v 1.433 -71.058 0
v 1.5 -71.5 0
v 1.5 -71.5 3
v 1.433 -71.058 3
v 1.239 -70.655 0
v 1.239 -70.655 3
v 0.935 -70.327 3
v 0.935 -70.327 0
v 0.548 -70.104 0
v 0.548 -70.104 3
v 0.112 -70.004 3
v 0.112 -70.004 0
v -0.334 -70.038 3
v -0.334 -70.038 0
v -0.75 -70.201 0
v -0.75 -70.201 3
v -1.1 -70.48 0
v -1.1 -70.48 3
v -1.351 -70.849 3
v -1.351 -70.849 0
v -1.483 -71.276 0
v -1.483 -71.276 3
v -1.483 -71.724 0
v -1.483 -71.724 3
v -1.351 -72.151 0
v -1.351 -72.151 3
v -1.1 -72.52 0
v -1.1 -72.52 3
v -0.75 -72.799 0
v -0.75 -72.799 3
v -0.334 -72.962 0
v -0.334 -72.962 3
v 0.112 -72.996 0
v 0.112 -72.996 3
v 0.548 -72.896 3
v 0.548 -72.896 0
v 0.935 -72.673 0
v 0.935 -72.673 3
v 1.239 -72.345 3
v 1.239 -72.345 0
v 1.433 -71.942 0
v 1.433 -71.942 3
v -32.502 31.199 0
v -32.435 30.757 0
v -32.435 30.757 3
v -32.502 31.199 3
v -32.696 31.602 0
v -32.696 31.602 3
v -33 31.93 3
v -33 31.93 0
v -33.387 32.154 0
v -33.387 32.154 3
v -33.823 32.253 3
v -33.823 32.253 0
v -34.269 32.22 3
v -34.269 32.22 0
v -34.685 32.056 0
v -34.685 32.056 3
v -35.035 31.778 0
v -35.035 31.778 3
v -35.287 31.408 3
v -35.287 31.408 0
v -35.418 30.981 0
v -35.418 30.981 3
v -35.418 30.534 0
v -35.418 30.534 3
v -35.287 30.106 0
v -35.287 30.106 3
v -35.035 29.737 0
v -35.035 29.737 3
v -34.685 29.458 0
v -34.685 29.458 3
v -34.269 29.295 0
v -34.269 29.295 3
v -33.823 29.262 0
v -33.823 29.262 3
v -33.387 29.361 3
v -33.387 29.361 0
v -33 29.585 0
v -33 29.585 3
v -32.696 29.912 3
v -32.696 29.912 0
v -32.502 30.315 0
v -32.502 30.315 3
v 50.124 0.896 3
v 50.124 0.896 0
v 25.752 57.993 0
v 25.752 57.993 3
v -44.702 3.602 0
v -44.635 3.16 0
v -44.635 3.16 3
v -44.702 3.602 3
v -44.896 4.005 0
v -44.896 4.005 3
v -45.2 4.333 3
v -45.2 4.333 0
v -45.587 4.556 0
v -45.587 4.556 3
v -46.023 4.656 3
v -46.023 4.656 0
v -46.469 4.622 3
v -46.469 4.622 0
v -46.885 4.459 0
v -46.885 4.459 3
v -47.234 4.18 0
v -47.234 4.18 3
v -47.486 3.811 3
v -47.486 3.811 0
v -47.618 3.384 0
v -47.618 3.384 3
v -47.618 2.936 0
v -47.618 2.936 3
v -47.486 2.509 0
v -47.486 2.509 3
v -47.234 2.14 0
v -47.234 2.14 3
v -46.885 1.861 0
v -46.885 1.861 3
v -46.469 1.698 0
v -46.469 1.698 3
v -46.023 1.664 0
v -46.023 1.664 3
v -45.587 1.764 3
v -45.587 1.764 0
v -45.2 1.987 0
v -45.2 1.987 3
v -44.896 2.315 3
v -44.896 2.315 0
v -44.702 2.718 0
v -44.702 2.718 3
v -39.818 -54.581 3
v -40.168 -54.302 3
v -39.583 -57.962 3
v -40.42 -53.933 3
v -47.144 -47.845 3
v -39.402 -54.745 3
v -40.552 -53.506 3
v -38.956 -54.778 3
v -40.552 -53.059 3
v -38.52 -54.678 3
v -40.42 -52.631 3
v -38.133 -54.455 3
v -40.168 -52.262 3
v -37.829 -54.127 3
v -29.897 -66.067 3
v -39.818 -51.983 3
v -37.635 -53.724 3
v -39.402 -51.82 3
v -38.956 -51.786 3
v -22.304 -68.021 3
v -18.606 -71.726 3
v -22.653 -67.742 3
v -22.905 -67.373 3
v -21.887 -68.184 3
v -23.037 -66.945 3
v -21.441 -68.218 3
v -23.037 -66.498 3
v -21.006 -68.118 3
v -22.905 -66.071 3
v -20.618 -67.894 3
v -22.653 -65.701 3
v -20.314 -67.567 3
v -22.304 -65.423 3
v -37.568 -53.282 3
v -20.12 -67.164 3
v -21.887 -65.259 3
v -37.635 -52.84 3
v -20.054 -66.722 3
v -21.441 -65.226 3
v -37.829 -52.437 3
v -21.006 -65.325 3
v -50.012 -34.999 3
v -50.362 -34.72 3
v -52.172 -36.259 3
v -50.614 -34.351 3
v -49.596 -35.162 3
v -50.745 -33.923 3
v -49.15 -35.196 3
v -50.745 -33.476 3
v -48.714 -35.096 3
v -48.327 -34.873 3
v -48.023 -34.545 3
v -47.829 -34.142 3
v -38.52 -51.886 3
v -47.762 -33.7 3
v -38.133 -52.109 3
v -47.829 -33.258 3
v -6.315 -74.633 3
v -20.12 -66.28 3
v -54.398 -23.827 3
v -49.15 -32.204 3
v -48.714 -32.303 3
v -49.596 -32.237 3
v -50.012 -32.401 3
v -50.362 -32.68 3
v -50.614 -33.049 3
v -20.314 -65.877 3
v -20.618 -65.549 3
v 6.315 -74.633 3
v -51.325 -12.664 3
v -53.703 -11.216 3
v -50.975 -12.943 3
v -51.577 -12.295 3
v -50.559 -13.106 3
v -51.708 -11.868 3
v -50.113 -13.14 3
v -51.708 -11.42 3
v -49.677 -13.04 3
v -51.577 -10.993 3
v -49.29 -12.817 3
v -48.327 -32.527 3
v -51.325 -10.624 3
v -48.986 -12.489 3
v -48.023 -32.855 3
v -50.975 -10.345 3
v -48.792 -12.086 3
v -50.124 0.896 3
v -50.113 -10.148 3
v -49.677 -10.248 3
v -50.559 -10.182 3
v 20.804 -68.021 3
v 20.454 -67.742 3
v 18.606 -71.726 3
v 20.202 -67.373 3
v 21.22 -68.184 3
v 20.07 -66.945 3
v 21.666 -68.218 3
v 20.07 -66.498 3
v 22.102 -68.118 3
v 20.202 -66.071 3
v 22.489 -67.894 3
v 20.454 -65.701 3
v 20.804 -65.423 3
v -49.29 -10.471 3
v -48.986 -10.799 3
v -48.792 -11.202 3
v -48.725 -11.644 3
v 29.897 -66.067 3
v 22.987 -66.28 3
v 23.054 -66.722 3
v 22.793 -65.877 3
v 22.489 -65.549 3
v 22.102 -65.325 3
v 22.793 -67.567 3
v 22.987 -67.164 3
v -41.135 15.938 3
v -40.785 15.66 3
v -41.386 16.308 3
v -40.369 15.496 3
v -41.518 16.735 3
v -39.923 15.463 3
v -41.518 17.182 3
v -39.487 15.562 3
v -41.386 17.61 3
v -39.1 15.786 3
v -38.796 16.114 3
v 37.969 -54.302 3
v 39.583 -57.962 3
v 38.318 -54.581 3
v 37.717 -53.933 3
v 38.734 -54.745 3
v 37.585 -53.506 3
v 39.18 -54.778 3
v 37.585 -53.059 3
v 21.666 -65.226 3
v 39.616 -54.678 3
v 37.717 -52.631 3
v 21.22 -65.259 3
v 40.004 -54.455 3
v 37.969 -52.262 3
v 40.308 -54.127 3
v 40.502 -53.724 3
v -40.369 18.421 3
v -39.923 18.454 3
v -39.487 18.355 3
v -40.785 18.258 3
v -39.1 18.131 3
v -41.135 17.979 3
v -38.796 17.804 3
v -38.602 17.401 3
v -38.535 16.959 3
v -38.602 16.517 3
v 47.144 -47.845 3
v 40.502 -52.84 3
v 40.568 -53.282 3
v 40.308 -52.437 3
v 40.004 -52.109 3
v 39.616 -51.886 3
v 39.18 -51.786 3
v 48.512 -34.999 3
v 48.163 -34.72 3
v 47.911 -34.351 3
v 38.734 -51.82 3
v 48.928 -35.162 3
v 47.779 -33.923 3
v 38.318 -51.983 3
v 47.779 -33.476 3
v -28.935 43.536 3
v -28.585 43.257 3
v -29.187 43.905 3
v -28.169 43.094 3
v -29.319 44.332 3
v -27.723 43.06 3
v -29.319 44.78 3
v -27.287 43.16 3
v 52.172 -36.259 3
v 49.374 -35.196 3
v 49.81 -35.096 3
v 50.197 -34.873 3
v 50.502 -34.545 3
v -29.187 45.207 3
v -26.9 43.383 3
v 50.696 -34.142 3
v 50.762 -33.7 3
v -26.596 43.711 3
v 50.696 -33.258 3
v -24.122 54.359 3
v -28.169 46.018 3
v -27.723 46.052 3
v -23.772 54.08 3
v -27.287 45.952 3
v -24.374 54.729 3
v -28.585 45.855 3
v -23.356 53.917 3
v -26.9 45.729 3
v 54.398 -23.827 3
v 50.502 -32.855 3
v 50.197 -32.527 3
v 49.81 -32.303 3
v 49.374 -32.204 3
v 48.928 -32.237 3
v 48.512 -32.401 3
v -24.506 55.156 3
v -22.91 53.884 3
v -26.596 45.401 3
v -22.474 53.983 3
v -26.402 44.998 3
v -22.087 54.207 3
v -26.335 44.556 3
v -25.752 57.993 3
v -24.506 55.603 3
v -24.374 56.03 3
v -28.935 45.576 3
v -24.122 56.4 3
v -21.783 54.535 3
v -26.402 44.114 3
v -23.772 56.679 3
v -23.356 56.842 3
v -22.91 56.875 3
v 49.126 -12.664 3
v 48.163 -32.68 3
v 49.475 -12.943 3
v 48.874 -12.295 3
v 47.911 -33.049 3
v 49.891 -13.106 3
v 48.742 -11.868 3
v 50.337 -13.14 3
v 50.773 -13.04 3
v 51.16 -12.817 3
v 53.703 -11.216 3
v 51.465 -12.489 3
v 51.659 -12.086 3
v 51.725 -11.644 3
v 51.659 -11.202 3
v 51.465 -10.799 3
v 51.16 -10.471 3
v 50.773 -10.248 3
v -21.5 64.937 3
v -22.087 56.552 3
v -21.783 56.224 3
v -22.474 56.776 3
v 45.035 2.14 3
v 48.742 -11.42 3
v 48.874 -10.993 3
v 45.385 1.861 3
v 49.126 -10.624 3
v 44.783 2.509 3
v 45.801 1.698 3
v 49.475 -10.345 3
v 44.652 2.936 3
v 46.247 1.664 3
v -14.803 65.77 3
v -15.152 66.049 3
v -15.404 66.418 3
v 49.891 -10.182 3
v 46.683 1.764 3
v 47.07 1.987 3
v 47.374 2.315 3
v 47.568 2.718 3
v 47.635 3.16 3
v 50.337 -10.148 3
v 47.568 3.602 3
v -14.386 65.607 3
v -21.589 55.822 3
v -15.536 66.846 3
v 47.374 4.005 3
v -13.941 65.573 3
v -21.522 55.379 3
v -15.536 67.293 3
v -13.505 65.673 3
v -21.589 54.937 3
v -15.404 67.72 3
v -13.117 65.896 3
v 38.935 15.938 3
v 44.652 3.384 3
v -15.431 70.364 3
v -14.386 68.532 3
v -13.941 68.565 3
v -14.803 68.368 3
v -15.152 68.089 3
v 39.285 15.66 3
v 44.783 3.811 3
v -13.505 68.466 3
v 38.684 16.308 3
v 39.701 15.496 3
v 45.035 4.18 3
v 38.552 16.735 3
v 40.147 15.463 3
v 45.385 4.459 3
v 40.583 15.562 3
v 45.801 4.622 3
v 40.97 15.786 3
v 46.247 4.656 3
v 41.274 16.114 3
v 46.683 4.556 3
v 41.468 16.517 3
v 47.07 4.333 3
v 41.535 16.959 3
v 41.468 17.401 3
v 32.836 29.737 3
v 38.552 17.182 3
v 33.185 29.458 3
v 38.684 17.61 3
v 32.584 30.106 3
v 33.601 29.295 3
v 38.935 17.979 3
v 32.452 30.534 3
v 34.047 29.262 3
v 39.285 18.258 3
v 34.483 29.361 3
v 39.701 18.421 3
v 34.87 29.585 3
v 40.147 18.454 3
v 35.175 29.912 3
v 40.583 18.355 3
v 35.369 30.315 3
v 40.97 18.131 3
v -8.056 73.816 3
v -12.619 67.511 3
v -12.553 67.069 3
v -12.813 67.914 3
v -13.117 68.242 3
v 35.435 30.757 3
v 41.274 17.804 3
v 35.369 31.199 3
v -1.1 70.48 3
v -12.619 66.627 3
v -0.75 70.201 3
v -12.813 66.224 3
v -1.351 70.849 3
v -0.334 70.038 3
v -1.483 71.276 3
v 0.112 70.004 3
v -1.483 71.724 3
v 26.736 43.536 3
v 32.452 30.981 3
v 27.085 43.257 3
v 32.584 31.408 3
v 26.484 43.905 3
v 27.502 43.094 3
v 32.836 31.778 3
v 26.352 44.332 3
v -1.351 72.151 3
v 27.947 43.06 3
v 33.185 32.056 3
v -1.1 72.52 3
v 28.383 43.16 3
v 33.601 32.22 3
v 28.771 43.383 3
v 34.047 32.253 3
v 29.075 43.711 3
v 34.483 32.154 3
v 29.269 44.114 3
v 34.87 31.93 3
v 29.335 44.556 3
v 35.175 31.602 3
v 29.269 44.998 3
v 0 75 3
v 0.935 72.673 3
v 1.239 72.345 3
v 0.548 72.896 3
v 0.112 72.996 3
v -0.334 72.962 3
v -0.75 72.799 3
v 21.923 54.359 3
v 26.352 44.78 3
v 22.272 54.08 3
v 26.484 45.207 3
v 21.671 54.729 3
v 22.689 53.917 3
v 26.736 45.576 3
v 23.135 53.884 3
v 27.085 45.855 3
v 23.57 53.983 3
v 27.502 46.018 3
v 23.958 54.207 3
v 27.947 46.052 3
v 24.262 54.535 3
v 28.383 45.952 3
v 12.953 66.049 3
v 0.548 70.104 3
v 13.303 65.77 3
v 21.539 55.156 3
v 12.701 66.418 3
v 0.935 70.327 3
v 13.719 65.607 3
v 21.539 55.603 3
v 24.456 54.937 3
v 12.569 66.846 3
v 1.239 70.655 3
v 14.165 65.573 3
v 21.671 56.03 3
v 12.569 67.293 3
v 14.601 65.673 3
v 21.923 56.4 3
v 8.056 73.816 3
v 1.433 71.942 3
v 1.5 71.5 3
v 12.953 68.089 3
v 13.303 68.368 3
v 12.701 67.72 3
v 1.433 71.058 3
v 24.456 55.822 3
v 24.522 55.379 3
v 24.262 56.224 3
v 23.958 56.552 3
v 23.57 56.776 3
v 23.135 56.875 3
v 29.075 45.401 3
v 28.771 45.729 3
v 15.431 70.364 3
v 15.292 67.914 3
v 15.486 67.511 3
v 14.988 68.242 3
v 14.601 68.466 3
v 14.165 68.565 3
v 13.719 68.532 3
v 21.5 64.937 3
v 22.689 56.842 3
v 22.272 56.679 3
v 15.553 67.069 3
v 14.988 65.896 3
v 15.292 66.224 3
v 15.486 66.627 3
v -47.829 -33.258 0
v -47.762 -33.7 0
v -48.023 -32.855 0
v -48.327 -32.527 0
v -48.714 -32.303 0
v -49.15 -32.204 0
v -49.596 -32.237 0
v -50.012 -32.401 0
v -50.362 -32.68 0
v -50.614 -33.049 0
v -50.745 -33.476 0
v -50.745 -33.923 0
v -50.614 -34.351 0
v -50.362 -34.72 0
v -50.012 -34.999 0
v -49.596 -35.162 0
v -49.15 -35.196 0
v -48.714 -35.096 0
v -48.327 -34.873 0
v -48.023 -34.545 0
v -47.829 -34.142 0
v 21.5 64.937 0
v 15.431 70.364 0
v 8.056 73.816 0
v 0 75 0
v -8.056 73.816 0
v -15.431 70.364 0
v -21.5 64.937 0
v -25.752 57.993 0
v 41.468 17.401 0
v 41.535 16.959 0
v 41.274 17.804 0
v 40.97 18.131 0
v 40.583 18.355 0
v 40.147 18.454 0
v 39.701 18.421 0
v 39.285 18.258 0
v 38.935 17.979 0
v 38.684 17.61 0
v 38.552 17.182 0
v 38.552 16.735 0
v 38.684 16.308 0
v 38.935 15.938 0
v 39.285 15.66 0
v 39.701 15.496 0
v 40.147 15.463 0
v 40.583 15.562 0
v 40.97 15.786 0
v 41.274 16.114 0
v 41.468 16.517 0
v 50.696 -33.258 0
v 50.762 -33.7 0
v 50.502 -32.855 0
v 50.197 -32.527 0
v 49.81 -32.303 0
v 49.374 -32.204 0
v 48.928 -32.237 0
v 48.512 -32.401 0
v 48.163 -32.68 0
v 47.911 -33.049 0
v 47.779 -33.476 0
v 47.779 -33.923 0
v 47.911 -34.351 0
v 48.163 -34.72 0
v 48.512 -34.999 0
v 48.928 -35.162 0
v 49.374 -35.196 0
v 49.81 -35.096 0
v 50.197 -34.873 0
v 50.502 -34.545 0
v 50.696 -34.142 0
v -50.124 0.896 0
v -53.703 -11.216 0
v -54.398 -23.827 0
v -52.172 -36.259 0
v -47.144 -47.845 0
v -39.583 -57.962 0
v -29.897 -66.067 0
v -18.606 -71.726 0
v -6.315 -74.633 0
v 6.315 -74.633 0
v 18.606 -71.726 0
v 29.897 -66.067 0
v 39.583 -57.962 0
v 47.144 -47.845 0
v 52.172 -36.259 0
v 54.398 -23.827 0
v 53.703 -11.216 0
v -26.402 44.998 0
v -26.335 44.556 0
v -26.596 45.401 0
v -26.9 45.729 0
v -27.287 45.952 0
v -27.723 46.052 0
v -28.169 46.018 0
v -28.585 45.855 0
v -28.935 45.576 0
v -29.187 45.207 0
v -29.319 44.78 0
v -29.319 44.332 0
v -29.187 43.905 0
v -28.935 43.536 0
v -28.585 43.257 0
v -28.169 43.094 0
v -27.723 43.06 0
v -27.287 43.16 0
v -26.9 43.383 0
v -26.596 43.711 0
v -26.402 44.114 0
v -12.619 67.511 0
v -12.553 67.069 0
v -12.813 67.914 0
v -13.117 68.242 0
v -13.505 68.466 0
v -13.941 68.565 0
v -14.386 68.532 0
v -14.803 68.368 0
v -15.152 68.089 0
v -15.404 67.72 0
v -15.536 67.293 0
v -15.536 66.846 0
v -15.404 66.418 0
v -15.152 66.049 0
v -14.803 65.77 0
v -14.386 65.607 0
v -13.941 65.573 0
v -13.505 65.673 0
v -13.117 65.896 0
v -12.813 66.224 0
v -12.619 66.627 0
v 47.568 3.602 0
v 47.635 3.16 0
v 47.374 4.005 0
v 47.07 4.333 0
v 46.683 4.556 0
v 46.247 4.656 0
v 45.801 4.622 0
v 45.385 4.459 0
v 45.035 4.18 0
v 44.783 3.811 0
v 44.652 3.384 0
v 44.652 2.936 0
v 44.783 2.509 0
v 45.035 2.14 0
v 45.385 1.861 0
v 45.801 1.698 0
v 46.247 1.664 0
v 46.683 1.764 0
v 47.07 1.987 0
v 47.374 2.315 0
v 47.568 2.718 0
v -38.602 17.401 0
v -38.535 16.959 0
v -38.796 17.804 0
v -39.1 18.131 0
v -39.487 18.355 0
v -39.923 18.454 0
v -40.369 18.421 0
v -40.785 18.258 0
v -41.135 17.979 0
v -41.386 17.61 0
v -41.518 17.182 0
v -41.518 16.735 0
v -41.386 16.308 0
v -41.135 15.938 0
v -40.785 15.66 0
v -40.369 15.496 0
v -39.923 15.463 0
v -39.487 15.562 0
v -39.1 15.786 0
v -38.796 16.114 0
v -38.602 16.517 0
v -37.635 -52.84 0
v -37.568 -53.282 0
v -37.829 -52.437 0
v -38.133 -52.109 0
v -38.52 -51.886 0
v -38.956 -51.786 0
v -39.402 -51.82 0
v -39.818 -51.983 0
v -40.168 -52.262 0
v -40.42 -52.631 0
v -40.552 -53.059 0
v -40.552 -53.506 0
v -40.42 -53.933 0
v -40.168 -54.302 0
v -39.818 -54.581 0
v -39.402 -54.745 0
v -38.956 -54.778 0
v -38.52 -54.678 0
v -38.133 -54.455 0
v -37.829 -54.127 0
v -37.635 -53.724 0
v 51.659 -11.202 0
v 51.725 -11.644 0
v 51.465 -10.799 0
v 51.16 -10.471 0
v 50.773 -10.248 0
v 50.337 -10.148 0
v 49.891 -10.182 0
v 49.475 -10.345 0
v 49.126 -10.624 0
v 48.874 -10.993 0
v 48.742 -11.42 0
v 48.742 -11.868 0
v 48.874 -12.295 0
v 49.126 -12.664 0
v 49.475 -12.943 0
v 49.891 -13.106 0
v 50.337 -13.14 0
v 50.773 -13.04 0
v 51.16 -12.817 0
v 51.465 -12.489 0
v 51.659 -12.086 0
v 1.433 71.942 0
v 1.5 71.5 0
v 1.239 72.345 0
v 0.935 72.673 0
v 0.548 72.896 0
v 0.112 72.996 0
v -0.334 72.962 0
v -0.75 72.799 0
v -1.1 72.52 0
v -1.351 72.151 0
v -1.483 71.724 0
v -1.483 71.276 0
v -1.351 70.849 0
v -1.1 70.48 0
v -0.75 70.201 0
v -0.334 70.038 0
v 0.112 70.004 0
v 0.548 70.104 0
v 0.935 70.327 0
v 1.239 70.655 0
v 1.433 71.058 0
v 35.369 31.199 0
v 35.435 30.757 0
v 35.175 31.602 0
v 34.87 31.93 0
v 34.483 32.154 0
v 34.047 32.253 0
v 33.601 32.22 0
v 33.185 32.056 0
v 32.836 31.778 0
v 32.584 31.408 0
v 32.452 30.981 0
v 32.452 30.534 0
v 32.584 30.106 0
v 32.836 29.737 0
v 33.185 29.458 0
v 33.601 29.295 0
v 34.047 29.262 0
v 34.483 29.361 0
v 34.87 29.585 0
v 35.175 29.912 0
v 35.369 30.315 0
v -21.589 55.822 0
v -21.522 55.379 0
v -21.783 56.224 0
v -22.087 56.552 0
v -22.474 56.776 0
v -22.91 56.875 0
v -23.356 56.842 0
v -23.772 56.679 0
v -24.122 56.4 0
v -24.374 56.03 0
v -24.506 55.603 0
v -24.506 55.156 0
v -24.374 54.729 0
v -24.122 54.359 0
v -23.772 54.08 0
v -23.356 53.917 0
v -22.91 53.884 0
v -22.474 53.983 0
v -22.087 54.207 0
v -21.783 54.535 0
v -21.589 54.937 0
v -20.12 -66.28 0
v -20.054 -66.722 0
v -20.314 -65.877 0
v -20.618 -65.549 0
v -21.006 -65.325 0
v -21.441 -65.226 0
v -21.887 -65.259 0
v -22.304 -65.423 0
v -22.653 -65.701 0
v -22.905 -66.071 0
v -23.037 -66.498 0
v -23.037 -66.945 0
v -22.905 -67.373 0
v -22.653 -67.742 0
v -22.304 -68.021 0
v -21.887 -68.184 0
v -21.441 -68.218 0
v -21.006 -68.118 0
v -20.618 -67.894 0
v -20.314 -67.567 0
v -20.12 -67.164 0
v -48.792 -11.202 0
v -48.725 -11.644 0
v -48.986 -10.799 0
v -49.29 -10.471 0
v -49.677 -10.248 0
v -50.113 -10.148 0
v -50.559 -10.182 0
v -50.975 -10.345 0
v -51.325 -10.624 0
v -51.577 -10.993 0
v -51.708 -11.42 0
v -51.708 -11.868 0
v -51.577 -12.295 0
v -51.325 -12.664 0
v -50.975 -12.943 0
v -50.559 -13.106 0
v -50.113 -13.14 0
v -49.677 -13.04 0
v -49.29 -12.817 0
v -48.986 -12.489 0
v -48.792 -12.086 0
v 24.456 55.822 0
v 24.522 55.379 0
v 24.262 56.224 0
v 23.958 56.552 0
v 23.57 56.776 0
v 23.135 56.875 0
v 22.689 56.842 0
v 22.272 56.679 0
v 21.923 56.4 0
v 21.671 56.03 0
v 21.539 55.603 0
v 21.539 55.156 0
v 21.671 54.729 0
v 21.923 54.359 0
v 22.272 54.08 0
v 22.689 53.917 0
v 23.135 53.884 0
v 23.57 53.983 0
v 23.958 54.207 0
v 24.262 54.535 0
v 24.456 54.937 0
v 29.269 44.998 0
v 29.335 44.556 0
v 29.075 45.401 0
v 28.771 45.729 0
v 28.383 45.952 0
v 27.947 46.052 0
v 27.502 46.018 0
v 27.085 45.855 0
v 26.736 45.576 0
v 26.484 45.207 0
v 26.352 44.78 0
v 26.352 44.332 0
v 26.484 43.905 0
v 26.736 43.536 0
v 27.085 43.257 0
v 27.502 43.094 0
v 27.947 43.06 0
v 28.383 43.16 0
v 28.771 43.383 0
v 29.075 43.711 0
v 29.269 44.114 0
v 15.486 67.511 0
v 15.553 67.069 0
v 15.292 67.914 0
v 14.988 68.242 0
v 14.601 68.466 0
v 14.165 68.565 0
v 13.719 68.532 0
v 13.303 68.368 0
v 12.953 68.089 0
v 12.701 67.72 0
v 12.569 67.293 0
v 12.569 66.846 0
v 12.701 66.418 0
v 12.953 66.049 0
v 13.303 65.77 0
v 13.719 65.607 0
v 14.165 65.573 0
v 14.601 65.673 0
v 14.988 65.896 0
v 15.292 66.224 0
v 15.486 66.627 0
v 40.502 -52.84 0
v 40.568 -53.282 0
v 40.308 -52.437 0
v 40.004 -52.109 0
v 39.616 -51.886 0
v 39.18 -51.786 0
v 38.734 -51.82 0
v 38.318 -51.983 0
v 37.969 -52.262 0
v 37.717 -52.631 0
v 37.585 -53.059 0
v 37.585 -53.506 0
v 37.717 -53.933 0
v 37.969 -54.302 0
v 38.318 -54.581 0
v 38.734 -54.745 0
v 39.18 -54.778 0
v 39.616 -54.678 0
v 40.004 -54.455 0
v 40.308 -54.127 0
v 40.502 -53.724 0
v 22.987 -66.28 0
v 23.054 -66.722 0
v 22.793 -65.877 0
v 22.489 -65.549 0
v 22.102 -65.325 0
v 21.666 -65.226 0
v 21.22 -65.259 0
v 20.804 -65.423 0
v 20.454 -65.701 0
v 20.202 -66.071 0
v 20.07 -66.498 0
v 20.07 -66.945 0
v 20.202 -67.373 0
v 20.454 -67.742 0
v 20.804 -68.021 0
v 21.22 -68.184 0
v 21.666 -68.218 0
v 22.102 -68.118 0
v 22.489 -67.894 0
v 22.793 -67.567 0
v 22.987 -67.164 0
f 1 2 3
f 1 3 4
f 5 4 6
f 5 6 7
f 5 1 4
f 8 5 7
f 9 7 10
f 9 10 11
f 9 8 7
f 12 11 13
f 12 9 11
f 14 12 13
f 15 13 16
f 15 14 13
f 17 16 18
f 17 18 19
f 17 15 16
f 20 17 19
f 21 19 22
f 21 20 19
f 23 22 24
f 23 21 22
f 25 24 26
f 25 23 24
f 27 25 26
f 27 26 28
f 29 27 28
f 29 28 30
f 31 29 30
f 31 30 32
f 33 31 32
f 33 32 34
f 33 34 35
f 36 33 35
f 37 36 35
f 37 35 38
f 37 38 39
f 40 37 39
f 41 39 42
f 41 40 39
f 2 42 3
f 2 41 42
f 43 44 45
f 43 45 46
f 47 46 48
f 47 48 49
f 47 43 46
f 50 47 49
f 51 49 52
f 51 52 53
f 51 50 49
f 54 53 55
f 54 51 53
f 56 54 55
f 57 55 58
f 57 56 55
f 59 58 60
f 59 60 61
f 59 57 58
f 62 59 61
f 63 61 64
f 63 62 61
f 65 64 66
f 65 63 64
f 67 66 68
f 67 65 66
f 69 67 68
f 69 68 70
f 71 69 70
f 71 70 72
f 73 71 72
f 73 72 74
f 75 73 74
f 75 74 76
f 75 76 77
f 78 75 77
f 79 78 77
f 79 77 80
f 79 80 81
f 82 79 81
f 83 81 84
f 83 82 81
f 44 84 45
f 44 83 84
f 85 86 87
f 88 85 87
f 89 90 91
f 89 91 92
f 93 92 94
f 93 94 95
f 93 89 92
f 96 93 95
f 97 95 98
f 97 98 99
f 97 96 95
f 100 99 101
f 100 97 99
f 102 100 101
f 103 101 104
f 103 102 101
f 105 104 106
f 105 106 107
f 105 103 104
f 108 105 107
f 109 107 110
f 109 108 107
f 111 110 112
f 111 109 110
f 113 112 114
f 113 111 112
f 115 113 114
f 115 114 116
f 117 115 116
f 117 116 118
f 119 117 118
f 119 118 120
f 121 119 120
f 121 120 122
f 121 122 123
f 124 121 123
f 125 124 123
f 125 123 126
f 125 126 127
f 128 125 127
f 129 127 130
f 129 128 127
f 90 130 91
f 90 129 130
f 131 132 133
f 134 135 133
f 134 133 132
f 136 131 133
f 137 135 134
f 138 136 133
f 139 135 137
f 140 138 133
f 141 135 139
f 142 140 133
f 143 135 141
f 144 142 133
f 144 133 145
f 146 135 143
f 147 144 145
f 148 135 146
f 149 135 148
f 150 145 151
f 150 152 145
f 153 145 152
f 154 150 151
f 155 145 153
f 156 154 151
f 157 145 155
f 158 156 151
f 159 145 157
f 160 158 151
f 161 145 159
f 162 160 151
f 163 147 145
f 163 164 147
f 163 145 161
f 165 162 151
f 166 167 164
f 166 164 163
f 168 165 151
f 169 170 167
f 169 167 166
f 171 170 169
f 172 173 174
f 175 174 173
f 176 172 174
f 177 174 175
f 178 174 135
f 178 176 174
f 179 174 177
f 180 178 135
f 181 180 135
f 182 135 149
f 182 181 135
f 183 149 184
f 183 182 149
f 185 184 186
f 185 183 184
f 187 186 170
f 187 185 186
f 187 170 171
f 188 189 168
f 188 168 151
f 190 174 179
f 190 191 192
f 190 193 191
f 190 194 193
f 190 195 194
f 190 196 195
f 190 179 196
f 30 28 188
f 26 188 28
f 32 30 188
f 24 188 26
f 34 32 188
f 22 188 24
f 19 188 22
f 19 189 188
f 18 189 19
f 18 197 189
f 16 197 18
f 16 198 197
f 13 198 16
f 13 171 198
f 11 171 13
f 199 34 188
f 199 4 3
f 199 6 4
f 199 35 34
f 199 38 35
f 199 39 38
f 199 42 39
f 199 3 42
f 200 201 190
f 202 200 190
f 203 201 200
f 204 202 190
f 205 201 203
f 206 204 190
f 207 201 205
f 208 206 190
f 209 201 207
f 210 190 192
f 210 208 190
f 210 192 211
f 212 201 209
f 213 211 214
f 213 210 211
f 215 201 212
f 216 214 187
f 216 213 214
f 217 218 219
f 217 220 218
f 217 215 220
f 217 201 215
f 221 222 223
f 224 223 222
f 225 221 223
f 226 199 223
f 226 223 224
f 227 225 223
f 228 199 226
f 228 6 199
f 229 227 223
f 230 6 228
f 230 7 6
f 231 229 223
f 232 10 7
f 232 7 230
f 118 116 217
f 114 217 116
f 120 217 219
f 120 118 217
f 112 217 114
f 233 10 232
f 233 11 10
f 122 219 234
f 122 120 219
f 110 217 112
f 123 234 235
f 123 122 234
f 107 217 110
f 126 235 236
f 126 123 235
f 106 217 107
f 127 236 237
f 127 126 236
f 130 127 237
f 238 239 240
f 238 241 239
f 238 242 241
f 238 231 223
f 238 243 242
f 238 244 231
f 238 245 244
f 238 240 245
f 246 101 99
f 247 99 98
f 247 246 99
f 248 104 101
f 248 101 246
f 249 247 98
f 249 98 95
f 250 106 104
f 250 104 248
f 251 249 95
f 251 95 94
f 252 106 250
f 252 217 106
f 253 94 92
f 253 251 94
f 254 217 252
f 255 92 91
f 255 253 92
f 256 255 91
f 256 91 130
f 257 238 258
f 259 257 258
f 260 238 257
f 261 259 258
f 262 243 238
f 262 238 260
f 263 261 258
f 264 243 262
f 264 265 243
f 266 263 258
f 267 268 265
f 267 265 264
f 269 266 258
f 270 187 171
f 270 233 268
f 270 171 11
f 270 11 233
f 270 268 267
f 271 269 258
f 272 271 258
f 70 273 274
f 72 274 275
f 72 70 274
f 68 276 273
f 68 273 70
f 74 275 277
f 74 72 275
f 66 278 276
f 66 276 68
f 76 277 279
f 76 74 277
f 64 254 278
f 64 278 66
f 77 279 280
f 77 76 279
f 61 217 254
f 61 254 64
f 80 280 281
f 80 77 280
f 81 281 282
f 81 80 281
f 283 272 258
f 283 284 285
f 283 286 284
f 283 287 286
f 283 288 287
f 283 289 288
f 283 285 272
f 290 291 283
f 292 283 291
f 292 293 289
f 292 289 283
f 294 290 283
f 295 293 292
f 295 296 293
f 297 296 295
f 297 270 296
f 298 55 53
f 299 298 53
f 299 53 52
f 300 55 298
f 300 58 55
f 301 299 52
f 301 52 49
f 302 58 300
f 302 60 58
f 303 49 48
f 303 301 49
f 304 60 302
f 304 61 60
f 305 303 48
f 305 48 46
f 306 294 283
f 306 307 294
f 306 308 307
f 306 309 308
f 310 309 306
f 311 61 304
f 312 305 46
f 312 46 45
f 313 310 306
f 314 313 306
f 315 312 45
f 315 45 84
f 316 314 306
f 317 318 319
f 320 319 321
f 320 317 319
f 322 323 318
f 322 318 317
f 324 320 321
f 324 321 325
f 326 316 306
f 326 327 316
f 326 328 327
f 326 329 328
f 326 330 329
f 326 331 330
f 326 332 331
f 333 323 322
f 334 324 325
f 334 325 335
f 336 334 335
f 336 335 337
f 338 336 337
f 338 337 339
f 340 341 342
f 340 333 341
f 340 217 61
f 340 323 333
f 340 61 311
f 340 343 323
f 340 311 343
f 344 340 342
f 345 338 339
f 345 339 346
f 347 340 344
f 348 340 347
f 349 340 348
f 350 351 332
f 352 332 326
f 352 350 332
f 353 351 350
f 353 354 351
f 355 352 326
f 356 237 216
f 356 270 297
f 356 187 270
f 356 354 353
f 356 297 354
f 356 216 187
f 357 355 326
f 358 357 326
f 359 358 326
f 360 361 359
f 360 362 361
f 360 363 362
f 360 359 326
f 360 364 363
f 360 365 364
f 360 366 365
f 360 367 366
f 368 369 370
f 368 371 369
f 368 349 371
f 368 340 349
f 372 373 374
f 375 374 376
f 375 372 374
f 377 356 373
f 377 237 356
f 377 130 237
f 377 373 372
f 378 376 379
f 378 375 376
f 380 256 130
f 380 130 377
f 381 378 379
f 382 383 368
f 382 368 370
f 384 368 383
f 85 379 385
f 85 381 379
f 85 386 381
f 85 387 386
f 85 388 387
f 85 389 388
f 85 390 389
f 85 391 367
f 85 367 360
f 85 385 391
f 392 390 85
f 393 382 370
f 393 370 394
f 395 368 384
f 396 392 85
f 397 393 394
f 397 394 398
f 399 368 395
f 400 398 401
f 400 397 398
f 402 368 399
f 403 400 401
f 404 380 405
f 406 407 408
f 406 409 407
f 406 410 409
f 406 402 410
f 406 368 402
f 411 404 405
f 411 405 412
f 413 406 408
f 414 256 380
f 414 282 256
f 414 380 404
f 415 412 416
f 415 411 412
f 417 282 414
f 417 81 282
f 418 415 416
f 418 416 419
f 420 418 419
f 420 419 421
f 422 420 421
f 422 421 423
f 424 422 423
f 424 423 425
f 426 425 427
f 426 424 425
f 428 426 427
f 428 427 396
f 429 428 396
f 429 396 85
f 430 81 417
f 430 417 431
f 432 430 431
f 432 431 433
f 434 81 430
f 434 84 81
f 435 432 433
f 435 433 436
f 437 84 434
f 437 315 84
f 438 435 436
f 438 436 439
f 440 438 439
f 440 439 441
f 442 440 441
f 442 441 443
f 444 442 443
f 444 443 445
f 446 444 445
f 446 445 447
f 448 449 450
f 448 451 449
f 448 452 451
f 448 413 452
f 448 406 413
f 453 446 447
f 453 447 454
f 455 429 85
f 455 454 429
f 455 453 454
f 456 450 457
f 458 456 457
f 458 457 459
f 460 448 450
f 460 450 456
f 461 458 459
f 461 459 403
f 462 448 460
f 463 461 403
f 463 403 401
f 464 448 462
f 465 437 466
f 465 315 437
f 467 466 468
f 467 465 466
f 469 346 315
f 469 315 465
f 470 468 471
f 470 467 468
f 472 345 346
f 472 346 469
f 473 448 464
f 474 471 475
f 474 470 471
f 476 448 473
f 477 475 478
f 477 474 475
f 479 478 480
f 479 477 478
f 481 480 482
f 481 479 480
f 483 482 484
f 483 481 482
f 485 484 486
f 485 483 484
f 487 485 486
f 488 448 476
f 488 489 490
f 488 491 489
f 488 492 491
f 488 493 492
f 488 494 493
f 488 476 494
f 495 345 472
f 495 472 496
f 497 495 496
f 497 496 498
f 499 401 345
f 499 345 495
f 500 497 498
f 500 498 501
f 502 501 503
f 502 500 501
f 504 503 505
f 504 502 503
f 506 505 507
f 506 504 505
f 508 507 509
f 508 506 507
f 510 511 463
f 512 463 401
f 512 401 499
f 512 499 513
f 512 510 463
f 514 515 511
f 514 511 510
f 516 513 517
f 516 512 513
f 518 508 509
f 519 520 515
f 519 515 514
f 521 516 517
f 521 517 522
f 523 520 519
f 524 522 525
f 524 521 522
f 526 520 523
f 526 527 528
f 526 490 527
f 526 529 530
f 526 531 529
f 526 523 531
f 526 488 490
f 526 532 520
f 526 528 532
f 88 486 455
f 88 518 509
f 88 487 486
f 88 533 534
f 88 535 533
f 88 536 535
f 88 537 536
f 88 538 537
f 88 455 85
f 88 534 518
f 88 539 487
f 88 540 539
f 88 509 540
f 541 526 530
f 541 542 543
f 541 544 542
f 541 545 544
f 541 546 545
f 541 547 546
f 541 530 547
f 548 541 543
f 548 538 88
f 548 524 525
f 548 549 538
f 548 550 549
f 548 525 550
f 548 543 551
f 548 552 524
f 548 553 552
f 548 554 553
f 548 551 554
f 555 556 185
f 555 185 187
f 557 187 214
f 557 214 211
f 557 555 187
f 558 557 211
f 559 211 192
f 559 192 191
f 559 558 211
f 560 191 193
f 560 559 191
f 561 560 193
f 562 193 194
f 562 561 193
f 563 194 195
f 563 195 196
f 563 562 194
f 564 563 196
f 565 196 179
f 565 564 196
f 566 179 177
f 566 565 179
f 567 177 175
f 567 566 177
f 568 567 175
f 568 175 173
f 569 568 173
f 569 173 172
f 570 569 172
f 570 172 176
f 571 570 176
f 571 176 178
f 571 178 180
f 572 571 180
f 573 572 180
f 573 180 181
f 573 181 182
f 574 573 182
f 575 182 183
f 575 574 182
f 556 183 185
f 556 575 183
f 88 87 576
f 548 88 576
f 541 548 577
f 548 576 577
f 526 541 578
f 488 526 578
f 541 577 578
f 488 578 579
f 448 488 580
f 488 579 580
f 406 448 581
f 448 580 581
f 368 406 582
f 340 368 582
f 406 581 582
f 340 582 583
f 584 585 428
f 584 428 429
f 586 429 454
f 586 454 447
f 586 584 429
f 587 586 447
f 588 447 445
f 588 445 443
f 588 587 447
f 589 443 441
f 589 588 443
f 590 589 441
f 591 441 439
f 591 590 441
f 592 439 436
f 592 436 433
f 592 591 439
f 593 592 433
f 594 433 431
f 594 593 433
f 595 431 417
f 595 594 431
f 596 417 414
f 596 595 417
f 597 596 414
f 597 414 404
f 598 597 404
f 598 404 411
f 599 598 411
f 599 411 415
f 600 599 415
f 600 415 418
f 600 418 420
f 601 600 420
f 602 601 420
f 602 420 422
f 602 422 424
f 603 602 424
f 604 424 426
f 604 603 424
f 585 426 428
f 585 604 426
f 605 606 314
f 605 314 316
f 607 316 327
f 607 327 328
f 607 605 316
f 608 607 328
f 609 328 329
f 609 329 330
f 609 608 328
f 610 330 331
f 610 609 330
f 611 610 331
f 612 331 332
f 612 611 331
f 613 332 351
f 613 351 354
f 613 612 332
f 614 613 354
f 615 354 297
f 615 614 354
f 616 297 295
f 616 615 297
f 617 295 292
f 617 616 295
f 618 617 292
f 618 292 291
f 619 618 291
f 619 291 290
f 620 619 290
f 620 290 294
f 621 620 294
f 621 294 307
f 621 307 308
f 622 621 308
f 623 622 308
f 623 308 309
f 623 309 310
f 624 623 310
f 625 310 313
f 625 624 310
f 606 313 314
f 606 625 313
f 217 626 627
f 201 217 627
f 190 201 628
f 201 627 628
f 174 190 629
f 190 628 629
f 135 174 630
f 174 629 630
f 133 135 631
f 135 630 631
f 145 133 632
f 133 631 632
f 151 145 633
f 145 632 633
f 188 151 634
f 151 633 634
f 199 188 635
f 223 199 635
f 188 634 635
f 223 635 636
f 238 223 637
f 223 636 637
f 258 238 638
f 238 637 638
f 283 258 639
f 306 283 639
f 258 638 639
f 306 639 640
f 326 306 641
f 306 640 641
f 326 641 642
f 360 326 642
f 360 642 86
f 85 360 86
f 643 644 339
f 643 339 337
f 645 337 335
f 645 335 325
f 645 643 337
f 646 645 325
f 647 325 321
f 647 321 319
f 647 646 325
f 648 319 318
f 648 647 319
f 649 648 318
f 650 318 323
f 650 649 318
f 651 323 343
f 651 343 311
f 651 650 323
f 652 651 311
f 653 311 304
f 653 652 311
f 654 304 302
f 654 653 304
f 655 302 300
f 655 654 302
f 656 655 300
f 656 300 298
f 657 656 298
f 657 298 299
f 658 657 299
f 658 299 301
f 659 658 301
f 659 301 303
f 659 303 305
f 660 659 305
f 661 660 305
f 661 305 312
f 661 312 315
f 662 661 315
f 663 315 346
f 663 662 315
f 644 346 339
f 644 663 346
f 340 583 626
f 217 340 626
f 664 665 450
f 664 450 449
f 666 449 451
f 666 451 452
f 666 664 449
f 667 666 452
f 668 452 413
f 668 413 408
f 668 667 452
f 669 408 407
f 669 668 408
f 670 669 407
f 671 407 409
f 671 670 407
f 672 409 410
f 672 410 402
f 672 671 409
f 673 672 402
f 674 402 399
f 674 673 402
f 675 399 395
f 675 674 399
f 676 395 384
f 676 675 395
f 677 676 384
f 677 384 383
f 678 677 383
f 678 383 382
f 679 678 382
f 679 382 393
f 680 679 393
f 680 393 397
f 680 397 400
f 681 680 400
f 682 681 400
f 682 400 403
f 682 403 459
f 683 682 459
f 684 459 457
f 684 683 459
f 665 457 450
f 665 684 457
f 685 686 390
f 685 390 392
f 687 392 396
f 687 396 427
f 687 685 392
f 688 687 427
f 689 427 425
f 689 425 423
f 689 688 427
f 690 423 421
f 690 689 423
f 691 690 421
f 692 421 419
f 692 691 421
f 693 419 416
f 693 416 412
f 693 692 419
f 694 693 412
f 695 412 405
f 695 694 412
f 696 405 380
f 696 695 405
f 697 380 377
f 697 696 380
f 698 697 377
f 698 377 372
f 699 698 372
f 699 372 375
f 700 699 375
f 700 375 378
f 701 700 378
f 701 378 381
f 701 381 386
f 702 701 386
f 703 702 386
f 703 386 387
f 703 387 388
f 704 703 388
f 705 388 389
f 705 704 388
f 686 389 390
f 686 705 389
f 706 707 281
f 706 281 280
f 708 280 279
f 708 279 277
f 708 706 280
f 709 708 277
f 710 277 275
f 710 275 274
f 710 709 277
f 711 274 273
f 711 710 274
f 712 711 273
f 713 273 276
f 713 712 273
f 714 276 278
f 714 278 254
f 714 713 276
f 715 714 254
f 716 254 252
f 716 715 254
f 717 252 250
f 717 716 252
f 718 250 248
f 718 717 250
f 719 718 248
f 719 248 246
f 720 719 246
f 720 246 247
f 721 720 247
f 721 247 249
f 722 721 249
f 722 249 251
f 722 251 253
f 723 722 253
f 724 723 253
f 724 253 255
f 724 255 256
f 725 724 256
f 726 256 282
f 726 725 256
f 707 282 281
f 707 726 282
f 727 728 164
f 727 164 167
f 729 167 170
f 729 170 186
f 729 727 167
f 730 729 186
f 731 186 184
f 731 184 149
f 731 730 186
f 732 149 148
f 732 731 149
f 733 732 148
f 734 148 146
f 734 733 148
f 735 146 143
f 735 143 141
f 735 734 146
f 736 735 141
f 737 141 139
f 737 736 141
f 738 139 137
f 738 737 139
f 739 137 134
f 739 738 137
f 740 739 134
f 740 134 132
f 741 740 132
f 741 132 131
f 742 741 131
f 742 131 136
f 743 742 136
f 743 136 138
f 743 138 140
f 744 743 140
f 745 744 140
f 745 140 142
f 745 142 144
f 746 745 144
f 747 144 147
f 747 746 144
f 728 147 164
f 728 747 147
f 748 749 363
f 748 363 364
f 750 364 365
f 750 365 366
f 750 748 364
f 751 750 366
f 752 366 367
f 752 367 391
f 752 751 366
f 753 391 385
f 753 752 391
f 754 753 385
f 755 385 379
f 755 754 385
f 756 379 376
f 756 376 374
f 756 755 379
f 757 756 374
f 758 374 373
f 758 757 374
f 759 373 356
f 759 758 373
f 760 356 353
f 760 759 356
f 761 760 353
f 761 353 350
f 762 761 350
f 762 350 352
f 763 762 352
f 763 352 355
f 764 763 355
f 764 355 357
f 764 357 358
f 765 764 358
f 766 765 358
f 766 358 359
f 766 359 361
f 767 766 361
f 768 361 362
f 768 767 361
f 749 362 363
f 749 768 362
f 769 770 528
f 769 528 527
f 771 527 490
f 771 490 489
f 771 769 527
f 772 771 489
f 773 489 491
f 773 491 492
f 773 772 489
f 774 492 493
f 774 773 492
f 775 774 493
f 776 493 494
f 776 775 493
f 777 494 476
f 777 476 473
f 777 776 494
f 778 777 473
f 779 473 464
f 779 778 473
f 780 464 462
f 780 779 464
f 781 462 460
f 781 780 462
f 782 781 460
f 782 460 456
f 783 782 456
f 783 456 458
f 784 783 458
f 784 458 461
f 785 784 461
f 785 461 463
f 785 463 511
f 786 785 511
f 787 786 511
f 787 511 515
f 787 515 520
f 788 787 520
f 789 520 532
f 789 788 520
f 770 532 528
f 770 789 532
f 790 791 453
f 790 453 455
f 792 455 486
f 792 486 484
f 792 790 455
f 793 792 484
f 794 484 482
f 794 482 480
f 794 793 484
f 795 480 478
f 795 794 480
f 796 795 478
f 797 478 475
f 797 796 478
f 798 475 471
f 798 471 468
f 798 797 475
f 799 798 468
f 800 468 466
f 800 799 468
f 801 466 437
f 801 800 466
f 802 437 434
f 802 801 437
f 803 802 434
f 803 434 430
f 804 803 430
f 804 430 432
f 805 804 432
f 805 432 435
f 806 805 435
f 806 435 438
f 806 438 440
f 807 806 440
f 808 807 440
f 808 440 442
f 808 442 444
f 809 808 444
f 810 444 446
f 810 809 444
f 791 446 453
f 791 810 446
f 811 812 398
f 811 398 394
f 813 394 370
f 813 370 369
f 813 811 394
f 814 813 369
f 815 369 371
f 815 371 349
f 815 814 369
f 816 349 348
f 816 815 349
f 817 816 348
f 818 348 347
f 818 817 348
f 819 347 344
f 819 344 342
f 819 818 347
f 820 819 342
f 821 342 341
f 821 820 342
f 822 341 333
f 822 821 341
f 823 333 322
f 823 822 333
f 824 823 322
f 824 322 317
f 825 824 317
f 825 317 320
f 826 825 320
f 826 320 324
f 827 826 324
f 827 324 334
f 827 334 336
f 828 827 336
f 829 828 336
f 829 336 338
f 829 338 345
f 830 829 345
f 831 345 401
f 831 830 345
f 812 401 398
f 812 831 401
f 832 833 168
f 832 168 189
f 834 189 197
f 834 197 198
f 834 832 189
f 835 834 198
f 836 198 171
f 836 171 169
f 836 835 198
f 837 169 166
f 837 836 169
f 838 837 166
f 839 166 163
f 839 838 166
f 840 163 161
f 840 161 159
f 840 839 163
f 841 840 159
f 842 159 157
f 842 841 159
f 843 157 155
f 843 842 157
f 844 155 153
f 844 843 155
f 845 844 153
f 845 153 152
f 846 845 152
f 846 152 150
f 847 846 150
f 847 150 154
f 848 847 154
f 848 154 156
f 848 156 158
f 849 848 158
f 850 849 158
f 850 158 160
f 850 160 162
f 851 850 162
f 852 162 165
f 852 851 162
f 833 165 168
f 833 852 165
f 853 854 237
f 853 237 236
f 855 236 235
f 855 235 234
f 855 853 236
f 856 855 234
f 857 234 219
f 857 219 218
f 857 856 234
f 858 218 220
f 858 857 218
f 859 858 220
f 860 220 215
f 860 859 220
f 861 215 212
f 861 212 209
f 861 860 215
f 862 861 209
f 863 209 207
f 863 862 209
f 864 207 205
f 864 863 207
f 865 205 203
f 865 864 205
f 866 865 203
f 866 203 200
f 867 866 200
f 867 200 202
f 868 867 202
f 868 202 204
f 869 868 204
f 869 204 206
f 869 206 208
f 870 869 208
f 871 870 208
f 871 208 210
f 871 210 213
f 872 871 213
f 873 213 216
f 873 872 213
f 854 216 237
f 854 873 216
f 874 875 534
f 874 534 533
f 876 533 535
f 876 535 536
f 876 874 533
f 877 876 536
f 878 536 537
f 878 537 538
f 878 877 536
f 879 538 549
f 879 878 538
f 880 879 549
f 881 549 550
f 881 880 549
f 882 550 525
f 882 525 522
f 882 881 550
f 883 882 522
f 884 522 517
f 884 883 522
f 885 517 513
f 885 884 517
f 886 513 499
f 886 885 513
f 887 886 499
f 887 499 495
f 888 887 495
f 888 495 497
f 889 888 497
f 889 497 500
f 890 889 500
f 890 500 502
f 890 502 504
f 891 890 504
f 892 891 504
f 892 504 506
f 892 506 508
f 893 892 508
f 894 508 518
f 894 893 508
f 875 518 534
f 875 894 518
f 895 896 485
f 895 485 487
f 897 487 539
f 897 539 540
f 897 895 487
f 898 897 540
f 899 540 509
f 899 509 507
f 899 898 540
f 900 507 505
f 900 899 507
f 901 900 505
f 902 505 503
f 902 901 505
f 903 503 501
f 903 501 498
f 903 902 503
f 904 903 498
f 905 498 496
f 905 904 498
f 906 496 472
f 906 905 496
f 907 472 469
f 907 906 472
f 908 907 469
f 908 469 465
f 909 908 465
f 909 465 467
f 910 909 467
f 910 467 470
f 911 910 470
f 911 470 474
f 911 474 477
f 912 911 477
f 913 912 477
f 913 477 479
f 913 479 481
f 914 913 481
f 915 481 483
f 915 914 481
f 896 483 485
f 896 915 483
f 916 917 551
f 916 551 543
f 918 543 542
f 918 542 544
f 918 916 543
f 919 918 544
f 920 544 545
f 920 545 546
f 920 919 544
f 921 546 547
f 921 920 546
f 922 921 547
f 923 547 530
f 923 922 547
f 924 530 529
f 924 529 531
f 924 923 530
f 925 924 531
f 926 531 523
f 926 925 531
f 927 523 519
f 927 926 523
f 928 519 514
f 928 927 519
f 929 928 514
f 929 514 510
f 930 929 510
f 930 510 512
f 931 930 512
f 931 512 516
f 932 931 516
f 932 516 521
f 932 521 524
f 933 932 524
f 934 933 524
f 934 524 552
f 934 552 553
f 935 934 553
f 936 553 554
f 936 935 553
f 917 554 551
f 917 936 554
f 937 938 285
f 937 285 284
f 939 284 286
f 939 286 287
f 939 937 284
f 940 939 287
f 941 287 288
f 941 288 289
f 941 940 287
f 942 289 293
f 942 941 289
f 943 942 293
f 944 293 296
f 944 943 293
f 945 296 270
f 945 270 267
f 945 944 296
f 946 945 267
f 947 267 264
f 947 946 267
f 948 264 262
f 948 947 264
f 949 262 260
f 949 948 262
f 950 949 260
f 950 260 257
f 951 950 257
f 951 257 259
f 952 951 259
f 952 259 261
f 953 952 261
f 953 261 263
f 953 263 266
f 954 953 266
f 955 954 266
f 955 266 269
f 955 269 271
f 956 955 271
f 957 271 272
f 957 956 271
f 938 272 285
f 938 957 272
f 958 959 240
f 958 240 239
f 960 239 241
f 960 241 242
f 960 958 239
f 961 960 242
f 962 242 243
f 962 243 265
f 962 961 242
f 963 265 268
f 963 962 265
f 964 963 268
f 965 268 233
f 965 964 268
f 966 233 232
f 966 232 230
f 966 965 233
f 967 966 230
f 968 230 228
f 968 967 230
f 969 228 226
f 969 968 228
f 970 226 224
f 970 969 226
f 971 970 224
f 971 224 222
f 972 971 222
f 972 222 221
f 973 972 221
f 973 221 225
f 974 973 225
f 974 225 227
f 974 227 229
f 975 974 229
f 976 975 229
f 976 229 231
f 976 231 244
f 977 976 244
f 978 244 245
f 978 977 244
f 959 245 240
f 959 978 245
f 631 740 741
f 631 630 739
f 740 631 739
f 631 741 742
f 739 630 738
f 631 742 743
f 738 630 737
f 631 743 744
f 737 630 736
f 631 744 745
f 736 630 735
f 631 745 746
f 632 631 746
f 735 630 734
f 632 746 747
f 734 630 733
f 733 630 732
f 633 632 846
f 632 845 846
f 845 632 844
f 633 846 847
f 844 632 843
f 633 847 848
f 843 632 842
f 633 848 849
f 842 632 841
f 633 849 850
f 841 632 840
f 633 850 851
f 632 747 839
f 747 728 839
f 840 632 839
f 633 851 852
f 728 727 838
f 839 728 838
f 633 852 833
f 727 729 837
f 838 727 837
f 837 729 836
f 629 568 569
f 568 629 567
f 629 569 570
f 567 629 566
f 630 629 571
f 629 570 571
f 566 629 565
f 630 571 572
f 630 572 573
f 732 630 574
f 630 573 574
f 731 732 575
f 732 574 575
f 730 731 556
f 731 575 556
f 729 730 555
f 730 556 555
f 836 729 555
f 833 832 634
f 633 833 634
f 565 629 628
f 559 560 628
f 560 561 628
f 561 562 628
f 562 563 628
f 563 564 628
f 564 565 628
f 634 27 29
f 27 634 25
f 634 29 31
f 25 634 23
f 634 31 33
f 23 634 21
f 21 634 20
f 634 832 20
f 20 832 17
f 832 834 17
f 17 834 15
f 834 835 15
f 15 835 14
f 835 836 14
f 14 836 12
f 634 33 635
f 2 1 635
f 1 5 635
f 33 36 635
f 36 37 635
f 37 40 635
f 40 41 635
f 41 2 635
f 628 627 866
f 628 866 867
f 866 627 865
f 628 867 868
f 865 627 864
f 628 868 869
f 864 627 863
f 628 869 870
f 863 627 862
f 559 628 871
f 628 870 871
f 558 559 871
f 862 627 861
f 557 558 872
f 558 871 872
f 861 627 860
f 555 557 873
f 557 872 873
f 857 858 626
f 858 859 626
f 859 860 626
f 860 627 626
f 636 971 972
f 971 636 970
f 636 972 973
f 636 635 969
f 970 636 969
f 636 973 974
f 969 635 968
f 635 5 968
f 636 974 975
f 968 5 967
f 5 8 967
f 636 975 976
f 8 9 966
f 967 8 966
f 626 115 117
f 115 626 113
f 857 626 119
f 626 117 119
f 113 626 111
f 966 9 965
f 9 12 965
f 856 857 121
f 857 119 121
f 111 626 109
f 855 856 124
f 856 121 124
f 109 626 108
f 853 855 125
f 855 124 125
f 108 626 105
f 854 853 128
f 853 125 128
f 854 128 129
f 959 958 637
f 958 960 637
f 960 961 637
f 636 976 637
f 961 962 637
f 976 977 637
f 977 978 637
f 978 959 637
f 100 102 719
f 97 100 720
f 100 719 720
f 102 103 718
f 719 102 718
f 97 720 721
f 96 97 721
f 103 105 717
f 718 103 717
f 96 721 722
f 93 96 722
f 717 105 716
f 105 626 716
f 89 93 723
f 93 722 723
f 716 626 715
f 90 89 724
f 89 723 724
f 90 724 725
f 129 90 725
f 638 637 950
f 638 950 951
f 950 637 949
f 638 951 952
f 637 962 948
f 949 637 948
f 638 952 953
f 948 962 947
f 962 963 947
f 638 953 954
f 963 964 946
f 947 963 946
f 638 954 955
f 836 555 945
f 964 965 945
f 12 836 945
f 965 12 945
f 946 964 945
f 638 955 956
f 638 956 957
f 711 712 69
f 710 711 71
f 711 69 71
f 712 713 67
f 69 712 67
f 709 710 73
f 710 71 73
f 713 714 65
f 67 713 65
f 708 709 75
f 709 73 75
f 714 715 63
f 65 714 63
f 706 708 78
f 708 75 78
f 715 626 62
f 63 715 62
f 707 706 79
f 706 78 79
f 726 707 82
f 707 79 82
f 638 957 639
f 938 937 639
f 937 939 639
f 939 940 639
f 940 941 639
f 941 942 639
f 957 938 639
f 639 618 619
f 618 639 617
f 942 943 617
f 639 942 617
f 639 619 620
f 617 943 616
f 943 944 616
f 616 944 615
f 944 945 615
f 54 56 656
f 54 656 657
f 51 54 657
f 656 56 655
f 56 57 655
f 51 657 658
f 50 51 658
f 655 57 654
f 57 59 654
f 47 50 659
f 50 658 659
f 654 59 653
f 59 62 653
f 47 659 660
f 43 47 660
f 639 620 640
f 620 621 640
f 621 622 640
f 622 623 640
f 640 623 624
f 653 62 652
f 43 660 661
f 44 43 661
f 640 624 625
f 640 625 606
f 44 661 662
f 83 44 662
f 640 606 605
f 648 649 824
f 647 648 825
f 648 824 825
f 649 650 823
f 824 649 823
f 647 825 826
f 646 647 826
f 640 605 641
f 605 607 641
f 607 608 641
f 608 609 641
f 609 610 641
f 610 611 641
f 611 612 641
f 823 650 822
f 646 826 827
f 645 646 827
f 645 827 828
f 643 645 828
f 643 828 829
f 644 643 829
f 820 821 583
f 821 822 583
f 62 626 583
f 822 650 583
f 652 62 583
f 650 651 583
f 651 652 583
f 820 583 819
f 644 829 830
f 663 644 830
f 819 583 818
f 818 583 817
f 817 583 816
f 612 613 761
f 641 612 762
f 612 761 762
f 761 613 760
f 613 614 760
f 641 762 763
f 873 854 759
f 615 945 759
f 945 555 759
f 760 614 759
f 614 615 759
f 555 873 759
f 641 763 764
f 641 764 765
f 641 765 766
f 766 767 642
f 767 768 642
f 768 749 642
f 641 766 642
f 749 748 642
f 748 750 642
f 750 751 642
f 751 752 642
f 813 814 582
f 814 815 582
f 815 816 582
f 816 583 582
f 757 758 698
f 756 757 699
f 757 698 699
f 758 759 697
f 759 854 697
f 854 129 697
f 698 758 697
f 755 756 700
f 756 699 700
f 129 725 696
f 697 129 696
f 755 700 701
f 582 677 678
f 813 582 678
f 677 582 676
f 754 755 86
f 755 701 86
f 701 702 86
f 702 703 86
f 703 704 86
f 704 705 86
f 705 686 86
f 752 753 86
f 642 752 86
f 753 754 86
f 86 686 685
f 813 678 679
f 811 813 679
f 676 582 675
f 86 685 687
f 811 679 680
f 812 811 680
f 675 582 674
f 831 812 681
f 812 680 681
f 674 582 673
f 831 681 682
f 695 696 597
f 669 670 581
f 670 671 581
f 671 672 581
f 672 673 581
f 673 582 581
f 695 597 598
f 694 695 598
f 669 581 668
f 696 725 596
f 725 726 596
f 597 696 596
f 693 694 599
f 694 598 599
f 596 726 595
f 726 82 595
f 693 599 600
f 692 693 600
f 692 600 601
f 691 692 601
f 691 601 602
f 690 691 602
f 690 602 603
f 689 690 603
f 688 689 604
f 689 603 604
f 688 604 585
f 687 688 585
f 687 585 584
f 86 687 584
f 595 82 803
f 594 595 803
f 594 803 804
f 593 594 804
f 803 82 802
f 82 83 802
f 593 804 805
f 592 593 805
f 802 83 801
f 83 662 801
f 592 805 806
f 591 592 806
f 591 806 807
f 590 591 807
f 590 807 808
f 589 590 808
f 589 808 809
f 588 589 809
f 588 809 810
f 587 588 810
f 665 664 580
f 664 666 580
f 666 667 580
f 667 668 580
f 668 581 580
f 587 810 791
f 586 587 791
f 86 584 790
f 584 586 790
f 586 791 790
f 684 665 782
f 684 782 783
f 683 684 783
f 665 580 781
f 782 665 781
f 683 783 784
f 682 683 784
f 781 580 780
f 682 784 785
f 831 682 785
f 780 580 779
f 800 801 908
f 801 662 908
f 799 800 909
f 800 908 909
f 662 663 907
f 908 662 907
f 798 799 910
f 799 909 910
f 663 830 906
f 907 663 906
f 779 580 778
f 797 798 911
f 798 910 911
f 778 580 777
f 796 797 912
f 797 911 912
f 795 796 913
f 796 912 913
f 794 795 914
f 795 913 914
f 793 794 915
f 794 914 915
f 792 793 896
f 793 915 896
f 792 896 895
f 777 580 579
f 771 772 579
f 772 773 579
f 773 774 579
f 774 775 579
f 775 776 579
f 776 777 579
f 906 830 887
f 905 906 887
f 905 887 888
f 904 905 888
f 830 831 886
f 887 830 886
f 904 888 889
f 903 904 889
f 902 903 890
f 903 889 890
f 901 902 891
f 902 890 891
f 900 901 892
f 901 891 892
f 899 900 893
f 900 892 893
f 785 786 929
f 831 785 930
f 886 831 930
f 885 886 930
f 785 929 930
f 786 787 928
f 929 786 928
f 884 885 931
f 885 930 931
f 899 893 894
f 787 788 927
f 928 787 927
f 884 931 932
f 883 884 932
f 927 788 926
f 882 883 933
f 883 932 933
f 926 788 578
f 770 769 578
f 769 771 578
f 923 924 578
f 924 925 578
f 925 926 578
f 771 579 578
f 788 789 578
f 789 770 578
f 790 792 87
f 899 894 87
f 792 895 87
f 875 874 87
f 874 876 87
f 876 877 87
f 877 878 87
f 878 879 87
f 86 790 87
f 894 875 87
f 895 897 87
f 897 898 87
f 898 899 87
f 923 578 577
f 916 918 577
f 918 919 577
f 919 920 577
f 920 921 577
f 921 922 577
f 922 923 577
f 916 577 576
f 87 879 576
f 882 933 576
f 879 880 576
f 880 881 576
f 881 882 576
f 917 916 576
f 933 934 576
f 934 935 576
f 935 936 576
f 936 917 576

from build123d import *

# Parameters (mm, degrees)
SKETCH1_R           = 1.5
BOSS_EXTRUDE1_DEPTH = 3


with BuildPart() as part:
    # Sketch1 → Boss-Extrude1 (new body)
    with BuildSketch(Plane.XY):
        with BuildLine():
            Line((-25.751949598, 57.992592593), (-50.124330467, 0.896296296))
            ThreePointArc((-50.124330467, 0.896296296), (0, -75), (50.124330467, 0.896296296))
            Line((50.124330467, 0.896296296), (25.751949598, 57.992592593))
            ThreePointArc((25.751949598, 57.992592593), (0, 75), (-25.751949598, 57.992592593))
        make_face()
        with Locations((0, -71.5)):
            Circle(SKETCH1_R, mode=Mode.SUBTRACT)
        with Locations((0, 71.5)):
            Circle(SKETCH1_R, mode=Mode.SUBTRACT)
        with Locations((14.052622691, 67.069225085)):
            Circle(SKETCH1_R, mode=Mode.SUBTRACT)
        with Locations((23.022469209, 55.379493511)):
            Circle(SKETCH1_R, mode=Mode.SUBTRACT)
        with Locations((21.553531349, -66.721697139)):
            Circle(SKETCH1_R, mode=Mode.SUBTRACT)
        with Locations((39.068266599, -53.282168094)):
            Circle(SKETCH1_R, mode=Mode.SUBTRACT)
        with Locations((49.262217141, -33.6997713)):
            Circle(SKETCH1_R, mode=Mode.SUBTRACT)
        with Locations((50.225195404, -11.643942939)):
            Circle(SKETCH1_R, mode=Mode.SUBTRACT)
        with Locations((27.835315177, 44.555939465)):
            Circle(SKETCH1_R, mode=Mode.SUBTRACT)
        with Locations((33.935175216, 30.757307943)):
            Circle(SKETCH1_R, mode=Mode.SUBTRACT)
        with Locations((40.035035255, 16.95867642)):
            Circle(SKETCH1_R, mode=Mode.SUBTRACT)
        with Locations((46.134895294, 3.160044897)):
            Circle(SKETCH1_R, mode=Mode.SUBTRACT)
        with Locations((-46.134895294, 3.160044897)):
            Circle(SKETCH1_R, mode=Mode.SUBTRACT)
        with Locations((-40.035035255, 16.95867642)):
            Circle(SKETCH1_R, mode=Mode.SUBTRACT)
        with Locations((-33.935175216, 30.757307943)):
            Circle(SKETCH1_R, mode=Mode.SUBTRACT)
        with Locations((-27.835315177, 44.555939465)):
            Circle(SKETCH1_R, mode=Mode.SUBTRACT)
        with Locations((-50.225195404, -11.643942939)):
            Circle(SKETCH1_R, mode=Mode.SUBTRACT)
        with Locations((-49.262217141, -33.6997713)):
            Circle(SKETCH1_R, mode=Mode.SUBTRACT)
        with Locations((-39.068266599, -53.282168094)):
            Circle(SKETCH1_R, mode=Mode.SUBTRACT)
        with Locations((-21.553531349, -66.721697139)):
            Circle(SKETCH1_R, mode=Mode.SUBTRACT)
        with Locations((-23.022469209, 55.379493511)):
            Circle(SKETCH1_R, mode=Mode.SUBTRACT)
        with Locations((-14.052622691, 67.069225085)):
            Circle(SKETCH1_R, mode=Mode.SUBTRACT)
    extrude(amount=BOSS_EXTRUDE1_DEPTH)


solid = part.part
